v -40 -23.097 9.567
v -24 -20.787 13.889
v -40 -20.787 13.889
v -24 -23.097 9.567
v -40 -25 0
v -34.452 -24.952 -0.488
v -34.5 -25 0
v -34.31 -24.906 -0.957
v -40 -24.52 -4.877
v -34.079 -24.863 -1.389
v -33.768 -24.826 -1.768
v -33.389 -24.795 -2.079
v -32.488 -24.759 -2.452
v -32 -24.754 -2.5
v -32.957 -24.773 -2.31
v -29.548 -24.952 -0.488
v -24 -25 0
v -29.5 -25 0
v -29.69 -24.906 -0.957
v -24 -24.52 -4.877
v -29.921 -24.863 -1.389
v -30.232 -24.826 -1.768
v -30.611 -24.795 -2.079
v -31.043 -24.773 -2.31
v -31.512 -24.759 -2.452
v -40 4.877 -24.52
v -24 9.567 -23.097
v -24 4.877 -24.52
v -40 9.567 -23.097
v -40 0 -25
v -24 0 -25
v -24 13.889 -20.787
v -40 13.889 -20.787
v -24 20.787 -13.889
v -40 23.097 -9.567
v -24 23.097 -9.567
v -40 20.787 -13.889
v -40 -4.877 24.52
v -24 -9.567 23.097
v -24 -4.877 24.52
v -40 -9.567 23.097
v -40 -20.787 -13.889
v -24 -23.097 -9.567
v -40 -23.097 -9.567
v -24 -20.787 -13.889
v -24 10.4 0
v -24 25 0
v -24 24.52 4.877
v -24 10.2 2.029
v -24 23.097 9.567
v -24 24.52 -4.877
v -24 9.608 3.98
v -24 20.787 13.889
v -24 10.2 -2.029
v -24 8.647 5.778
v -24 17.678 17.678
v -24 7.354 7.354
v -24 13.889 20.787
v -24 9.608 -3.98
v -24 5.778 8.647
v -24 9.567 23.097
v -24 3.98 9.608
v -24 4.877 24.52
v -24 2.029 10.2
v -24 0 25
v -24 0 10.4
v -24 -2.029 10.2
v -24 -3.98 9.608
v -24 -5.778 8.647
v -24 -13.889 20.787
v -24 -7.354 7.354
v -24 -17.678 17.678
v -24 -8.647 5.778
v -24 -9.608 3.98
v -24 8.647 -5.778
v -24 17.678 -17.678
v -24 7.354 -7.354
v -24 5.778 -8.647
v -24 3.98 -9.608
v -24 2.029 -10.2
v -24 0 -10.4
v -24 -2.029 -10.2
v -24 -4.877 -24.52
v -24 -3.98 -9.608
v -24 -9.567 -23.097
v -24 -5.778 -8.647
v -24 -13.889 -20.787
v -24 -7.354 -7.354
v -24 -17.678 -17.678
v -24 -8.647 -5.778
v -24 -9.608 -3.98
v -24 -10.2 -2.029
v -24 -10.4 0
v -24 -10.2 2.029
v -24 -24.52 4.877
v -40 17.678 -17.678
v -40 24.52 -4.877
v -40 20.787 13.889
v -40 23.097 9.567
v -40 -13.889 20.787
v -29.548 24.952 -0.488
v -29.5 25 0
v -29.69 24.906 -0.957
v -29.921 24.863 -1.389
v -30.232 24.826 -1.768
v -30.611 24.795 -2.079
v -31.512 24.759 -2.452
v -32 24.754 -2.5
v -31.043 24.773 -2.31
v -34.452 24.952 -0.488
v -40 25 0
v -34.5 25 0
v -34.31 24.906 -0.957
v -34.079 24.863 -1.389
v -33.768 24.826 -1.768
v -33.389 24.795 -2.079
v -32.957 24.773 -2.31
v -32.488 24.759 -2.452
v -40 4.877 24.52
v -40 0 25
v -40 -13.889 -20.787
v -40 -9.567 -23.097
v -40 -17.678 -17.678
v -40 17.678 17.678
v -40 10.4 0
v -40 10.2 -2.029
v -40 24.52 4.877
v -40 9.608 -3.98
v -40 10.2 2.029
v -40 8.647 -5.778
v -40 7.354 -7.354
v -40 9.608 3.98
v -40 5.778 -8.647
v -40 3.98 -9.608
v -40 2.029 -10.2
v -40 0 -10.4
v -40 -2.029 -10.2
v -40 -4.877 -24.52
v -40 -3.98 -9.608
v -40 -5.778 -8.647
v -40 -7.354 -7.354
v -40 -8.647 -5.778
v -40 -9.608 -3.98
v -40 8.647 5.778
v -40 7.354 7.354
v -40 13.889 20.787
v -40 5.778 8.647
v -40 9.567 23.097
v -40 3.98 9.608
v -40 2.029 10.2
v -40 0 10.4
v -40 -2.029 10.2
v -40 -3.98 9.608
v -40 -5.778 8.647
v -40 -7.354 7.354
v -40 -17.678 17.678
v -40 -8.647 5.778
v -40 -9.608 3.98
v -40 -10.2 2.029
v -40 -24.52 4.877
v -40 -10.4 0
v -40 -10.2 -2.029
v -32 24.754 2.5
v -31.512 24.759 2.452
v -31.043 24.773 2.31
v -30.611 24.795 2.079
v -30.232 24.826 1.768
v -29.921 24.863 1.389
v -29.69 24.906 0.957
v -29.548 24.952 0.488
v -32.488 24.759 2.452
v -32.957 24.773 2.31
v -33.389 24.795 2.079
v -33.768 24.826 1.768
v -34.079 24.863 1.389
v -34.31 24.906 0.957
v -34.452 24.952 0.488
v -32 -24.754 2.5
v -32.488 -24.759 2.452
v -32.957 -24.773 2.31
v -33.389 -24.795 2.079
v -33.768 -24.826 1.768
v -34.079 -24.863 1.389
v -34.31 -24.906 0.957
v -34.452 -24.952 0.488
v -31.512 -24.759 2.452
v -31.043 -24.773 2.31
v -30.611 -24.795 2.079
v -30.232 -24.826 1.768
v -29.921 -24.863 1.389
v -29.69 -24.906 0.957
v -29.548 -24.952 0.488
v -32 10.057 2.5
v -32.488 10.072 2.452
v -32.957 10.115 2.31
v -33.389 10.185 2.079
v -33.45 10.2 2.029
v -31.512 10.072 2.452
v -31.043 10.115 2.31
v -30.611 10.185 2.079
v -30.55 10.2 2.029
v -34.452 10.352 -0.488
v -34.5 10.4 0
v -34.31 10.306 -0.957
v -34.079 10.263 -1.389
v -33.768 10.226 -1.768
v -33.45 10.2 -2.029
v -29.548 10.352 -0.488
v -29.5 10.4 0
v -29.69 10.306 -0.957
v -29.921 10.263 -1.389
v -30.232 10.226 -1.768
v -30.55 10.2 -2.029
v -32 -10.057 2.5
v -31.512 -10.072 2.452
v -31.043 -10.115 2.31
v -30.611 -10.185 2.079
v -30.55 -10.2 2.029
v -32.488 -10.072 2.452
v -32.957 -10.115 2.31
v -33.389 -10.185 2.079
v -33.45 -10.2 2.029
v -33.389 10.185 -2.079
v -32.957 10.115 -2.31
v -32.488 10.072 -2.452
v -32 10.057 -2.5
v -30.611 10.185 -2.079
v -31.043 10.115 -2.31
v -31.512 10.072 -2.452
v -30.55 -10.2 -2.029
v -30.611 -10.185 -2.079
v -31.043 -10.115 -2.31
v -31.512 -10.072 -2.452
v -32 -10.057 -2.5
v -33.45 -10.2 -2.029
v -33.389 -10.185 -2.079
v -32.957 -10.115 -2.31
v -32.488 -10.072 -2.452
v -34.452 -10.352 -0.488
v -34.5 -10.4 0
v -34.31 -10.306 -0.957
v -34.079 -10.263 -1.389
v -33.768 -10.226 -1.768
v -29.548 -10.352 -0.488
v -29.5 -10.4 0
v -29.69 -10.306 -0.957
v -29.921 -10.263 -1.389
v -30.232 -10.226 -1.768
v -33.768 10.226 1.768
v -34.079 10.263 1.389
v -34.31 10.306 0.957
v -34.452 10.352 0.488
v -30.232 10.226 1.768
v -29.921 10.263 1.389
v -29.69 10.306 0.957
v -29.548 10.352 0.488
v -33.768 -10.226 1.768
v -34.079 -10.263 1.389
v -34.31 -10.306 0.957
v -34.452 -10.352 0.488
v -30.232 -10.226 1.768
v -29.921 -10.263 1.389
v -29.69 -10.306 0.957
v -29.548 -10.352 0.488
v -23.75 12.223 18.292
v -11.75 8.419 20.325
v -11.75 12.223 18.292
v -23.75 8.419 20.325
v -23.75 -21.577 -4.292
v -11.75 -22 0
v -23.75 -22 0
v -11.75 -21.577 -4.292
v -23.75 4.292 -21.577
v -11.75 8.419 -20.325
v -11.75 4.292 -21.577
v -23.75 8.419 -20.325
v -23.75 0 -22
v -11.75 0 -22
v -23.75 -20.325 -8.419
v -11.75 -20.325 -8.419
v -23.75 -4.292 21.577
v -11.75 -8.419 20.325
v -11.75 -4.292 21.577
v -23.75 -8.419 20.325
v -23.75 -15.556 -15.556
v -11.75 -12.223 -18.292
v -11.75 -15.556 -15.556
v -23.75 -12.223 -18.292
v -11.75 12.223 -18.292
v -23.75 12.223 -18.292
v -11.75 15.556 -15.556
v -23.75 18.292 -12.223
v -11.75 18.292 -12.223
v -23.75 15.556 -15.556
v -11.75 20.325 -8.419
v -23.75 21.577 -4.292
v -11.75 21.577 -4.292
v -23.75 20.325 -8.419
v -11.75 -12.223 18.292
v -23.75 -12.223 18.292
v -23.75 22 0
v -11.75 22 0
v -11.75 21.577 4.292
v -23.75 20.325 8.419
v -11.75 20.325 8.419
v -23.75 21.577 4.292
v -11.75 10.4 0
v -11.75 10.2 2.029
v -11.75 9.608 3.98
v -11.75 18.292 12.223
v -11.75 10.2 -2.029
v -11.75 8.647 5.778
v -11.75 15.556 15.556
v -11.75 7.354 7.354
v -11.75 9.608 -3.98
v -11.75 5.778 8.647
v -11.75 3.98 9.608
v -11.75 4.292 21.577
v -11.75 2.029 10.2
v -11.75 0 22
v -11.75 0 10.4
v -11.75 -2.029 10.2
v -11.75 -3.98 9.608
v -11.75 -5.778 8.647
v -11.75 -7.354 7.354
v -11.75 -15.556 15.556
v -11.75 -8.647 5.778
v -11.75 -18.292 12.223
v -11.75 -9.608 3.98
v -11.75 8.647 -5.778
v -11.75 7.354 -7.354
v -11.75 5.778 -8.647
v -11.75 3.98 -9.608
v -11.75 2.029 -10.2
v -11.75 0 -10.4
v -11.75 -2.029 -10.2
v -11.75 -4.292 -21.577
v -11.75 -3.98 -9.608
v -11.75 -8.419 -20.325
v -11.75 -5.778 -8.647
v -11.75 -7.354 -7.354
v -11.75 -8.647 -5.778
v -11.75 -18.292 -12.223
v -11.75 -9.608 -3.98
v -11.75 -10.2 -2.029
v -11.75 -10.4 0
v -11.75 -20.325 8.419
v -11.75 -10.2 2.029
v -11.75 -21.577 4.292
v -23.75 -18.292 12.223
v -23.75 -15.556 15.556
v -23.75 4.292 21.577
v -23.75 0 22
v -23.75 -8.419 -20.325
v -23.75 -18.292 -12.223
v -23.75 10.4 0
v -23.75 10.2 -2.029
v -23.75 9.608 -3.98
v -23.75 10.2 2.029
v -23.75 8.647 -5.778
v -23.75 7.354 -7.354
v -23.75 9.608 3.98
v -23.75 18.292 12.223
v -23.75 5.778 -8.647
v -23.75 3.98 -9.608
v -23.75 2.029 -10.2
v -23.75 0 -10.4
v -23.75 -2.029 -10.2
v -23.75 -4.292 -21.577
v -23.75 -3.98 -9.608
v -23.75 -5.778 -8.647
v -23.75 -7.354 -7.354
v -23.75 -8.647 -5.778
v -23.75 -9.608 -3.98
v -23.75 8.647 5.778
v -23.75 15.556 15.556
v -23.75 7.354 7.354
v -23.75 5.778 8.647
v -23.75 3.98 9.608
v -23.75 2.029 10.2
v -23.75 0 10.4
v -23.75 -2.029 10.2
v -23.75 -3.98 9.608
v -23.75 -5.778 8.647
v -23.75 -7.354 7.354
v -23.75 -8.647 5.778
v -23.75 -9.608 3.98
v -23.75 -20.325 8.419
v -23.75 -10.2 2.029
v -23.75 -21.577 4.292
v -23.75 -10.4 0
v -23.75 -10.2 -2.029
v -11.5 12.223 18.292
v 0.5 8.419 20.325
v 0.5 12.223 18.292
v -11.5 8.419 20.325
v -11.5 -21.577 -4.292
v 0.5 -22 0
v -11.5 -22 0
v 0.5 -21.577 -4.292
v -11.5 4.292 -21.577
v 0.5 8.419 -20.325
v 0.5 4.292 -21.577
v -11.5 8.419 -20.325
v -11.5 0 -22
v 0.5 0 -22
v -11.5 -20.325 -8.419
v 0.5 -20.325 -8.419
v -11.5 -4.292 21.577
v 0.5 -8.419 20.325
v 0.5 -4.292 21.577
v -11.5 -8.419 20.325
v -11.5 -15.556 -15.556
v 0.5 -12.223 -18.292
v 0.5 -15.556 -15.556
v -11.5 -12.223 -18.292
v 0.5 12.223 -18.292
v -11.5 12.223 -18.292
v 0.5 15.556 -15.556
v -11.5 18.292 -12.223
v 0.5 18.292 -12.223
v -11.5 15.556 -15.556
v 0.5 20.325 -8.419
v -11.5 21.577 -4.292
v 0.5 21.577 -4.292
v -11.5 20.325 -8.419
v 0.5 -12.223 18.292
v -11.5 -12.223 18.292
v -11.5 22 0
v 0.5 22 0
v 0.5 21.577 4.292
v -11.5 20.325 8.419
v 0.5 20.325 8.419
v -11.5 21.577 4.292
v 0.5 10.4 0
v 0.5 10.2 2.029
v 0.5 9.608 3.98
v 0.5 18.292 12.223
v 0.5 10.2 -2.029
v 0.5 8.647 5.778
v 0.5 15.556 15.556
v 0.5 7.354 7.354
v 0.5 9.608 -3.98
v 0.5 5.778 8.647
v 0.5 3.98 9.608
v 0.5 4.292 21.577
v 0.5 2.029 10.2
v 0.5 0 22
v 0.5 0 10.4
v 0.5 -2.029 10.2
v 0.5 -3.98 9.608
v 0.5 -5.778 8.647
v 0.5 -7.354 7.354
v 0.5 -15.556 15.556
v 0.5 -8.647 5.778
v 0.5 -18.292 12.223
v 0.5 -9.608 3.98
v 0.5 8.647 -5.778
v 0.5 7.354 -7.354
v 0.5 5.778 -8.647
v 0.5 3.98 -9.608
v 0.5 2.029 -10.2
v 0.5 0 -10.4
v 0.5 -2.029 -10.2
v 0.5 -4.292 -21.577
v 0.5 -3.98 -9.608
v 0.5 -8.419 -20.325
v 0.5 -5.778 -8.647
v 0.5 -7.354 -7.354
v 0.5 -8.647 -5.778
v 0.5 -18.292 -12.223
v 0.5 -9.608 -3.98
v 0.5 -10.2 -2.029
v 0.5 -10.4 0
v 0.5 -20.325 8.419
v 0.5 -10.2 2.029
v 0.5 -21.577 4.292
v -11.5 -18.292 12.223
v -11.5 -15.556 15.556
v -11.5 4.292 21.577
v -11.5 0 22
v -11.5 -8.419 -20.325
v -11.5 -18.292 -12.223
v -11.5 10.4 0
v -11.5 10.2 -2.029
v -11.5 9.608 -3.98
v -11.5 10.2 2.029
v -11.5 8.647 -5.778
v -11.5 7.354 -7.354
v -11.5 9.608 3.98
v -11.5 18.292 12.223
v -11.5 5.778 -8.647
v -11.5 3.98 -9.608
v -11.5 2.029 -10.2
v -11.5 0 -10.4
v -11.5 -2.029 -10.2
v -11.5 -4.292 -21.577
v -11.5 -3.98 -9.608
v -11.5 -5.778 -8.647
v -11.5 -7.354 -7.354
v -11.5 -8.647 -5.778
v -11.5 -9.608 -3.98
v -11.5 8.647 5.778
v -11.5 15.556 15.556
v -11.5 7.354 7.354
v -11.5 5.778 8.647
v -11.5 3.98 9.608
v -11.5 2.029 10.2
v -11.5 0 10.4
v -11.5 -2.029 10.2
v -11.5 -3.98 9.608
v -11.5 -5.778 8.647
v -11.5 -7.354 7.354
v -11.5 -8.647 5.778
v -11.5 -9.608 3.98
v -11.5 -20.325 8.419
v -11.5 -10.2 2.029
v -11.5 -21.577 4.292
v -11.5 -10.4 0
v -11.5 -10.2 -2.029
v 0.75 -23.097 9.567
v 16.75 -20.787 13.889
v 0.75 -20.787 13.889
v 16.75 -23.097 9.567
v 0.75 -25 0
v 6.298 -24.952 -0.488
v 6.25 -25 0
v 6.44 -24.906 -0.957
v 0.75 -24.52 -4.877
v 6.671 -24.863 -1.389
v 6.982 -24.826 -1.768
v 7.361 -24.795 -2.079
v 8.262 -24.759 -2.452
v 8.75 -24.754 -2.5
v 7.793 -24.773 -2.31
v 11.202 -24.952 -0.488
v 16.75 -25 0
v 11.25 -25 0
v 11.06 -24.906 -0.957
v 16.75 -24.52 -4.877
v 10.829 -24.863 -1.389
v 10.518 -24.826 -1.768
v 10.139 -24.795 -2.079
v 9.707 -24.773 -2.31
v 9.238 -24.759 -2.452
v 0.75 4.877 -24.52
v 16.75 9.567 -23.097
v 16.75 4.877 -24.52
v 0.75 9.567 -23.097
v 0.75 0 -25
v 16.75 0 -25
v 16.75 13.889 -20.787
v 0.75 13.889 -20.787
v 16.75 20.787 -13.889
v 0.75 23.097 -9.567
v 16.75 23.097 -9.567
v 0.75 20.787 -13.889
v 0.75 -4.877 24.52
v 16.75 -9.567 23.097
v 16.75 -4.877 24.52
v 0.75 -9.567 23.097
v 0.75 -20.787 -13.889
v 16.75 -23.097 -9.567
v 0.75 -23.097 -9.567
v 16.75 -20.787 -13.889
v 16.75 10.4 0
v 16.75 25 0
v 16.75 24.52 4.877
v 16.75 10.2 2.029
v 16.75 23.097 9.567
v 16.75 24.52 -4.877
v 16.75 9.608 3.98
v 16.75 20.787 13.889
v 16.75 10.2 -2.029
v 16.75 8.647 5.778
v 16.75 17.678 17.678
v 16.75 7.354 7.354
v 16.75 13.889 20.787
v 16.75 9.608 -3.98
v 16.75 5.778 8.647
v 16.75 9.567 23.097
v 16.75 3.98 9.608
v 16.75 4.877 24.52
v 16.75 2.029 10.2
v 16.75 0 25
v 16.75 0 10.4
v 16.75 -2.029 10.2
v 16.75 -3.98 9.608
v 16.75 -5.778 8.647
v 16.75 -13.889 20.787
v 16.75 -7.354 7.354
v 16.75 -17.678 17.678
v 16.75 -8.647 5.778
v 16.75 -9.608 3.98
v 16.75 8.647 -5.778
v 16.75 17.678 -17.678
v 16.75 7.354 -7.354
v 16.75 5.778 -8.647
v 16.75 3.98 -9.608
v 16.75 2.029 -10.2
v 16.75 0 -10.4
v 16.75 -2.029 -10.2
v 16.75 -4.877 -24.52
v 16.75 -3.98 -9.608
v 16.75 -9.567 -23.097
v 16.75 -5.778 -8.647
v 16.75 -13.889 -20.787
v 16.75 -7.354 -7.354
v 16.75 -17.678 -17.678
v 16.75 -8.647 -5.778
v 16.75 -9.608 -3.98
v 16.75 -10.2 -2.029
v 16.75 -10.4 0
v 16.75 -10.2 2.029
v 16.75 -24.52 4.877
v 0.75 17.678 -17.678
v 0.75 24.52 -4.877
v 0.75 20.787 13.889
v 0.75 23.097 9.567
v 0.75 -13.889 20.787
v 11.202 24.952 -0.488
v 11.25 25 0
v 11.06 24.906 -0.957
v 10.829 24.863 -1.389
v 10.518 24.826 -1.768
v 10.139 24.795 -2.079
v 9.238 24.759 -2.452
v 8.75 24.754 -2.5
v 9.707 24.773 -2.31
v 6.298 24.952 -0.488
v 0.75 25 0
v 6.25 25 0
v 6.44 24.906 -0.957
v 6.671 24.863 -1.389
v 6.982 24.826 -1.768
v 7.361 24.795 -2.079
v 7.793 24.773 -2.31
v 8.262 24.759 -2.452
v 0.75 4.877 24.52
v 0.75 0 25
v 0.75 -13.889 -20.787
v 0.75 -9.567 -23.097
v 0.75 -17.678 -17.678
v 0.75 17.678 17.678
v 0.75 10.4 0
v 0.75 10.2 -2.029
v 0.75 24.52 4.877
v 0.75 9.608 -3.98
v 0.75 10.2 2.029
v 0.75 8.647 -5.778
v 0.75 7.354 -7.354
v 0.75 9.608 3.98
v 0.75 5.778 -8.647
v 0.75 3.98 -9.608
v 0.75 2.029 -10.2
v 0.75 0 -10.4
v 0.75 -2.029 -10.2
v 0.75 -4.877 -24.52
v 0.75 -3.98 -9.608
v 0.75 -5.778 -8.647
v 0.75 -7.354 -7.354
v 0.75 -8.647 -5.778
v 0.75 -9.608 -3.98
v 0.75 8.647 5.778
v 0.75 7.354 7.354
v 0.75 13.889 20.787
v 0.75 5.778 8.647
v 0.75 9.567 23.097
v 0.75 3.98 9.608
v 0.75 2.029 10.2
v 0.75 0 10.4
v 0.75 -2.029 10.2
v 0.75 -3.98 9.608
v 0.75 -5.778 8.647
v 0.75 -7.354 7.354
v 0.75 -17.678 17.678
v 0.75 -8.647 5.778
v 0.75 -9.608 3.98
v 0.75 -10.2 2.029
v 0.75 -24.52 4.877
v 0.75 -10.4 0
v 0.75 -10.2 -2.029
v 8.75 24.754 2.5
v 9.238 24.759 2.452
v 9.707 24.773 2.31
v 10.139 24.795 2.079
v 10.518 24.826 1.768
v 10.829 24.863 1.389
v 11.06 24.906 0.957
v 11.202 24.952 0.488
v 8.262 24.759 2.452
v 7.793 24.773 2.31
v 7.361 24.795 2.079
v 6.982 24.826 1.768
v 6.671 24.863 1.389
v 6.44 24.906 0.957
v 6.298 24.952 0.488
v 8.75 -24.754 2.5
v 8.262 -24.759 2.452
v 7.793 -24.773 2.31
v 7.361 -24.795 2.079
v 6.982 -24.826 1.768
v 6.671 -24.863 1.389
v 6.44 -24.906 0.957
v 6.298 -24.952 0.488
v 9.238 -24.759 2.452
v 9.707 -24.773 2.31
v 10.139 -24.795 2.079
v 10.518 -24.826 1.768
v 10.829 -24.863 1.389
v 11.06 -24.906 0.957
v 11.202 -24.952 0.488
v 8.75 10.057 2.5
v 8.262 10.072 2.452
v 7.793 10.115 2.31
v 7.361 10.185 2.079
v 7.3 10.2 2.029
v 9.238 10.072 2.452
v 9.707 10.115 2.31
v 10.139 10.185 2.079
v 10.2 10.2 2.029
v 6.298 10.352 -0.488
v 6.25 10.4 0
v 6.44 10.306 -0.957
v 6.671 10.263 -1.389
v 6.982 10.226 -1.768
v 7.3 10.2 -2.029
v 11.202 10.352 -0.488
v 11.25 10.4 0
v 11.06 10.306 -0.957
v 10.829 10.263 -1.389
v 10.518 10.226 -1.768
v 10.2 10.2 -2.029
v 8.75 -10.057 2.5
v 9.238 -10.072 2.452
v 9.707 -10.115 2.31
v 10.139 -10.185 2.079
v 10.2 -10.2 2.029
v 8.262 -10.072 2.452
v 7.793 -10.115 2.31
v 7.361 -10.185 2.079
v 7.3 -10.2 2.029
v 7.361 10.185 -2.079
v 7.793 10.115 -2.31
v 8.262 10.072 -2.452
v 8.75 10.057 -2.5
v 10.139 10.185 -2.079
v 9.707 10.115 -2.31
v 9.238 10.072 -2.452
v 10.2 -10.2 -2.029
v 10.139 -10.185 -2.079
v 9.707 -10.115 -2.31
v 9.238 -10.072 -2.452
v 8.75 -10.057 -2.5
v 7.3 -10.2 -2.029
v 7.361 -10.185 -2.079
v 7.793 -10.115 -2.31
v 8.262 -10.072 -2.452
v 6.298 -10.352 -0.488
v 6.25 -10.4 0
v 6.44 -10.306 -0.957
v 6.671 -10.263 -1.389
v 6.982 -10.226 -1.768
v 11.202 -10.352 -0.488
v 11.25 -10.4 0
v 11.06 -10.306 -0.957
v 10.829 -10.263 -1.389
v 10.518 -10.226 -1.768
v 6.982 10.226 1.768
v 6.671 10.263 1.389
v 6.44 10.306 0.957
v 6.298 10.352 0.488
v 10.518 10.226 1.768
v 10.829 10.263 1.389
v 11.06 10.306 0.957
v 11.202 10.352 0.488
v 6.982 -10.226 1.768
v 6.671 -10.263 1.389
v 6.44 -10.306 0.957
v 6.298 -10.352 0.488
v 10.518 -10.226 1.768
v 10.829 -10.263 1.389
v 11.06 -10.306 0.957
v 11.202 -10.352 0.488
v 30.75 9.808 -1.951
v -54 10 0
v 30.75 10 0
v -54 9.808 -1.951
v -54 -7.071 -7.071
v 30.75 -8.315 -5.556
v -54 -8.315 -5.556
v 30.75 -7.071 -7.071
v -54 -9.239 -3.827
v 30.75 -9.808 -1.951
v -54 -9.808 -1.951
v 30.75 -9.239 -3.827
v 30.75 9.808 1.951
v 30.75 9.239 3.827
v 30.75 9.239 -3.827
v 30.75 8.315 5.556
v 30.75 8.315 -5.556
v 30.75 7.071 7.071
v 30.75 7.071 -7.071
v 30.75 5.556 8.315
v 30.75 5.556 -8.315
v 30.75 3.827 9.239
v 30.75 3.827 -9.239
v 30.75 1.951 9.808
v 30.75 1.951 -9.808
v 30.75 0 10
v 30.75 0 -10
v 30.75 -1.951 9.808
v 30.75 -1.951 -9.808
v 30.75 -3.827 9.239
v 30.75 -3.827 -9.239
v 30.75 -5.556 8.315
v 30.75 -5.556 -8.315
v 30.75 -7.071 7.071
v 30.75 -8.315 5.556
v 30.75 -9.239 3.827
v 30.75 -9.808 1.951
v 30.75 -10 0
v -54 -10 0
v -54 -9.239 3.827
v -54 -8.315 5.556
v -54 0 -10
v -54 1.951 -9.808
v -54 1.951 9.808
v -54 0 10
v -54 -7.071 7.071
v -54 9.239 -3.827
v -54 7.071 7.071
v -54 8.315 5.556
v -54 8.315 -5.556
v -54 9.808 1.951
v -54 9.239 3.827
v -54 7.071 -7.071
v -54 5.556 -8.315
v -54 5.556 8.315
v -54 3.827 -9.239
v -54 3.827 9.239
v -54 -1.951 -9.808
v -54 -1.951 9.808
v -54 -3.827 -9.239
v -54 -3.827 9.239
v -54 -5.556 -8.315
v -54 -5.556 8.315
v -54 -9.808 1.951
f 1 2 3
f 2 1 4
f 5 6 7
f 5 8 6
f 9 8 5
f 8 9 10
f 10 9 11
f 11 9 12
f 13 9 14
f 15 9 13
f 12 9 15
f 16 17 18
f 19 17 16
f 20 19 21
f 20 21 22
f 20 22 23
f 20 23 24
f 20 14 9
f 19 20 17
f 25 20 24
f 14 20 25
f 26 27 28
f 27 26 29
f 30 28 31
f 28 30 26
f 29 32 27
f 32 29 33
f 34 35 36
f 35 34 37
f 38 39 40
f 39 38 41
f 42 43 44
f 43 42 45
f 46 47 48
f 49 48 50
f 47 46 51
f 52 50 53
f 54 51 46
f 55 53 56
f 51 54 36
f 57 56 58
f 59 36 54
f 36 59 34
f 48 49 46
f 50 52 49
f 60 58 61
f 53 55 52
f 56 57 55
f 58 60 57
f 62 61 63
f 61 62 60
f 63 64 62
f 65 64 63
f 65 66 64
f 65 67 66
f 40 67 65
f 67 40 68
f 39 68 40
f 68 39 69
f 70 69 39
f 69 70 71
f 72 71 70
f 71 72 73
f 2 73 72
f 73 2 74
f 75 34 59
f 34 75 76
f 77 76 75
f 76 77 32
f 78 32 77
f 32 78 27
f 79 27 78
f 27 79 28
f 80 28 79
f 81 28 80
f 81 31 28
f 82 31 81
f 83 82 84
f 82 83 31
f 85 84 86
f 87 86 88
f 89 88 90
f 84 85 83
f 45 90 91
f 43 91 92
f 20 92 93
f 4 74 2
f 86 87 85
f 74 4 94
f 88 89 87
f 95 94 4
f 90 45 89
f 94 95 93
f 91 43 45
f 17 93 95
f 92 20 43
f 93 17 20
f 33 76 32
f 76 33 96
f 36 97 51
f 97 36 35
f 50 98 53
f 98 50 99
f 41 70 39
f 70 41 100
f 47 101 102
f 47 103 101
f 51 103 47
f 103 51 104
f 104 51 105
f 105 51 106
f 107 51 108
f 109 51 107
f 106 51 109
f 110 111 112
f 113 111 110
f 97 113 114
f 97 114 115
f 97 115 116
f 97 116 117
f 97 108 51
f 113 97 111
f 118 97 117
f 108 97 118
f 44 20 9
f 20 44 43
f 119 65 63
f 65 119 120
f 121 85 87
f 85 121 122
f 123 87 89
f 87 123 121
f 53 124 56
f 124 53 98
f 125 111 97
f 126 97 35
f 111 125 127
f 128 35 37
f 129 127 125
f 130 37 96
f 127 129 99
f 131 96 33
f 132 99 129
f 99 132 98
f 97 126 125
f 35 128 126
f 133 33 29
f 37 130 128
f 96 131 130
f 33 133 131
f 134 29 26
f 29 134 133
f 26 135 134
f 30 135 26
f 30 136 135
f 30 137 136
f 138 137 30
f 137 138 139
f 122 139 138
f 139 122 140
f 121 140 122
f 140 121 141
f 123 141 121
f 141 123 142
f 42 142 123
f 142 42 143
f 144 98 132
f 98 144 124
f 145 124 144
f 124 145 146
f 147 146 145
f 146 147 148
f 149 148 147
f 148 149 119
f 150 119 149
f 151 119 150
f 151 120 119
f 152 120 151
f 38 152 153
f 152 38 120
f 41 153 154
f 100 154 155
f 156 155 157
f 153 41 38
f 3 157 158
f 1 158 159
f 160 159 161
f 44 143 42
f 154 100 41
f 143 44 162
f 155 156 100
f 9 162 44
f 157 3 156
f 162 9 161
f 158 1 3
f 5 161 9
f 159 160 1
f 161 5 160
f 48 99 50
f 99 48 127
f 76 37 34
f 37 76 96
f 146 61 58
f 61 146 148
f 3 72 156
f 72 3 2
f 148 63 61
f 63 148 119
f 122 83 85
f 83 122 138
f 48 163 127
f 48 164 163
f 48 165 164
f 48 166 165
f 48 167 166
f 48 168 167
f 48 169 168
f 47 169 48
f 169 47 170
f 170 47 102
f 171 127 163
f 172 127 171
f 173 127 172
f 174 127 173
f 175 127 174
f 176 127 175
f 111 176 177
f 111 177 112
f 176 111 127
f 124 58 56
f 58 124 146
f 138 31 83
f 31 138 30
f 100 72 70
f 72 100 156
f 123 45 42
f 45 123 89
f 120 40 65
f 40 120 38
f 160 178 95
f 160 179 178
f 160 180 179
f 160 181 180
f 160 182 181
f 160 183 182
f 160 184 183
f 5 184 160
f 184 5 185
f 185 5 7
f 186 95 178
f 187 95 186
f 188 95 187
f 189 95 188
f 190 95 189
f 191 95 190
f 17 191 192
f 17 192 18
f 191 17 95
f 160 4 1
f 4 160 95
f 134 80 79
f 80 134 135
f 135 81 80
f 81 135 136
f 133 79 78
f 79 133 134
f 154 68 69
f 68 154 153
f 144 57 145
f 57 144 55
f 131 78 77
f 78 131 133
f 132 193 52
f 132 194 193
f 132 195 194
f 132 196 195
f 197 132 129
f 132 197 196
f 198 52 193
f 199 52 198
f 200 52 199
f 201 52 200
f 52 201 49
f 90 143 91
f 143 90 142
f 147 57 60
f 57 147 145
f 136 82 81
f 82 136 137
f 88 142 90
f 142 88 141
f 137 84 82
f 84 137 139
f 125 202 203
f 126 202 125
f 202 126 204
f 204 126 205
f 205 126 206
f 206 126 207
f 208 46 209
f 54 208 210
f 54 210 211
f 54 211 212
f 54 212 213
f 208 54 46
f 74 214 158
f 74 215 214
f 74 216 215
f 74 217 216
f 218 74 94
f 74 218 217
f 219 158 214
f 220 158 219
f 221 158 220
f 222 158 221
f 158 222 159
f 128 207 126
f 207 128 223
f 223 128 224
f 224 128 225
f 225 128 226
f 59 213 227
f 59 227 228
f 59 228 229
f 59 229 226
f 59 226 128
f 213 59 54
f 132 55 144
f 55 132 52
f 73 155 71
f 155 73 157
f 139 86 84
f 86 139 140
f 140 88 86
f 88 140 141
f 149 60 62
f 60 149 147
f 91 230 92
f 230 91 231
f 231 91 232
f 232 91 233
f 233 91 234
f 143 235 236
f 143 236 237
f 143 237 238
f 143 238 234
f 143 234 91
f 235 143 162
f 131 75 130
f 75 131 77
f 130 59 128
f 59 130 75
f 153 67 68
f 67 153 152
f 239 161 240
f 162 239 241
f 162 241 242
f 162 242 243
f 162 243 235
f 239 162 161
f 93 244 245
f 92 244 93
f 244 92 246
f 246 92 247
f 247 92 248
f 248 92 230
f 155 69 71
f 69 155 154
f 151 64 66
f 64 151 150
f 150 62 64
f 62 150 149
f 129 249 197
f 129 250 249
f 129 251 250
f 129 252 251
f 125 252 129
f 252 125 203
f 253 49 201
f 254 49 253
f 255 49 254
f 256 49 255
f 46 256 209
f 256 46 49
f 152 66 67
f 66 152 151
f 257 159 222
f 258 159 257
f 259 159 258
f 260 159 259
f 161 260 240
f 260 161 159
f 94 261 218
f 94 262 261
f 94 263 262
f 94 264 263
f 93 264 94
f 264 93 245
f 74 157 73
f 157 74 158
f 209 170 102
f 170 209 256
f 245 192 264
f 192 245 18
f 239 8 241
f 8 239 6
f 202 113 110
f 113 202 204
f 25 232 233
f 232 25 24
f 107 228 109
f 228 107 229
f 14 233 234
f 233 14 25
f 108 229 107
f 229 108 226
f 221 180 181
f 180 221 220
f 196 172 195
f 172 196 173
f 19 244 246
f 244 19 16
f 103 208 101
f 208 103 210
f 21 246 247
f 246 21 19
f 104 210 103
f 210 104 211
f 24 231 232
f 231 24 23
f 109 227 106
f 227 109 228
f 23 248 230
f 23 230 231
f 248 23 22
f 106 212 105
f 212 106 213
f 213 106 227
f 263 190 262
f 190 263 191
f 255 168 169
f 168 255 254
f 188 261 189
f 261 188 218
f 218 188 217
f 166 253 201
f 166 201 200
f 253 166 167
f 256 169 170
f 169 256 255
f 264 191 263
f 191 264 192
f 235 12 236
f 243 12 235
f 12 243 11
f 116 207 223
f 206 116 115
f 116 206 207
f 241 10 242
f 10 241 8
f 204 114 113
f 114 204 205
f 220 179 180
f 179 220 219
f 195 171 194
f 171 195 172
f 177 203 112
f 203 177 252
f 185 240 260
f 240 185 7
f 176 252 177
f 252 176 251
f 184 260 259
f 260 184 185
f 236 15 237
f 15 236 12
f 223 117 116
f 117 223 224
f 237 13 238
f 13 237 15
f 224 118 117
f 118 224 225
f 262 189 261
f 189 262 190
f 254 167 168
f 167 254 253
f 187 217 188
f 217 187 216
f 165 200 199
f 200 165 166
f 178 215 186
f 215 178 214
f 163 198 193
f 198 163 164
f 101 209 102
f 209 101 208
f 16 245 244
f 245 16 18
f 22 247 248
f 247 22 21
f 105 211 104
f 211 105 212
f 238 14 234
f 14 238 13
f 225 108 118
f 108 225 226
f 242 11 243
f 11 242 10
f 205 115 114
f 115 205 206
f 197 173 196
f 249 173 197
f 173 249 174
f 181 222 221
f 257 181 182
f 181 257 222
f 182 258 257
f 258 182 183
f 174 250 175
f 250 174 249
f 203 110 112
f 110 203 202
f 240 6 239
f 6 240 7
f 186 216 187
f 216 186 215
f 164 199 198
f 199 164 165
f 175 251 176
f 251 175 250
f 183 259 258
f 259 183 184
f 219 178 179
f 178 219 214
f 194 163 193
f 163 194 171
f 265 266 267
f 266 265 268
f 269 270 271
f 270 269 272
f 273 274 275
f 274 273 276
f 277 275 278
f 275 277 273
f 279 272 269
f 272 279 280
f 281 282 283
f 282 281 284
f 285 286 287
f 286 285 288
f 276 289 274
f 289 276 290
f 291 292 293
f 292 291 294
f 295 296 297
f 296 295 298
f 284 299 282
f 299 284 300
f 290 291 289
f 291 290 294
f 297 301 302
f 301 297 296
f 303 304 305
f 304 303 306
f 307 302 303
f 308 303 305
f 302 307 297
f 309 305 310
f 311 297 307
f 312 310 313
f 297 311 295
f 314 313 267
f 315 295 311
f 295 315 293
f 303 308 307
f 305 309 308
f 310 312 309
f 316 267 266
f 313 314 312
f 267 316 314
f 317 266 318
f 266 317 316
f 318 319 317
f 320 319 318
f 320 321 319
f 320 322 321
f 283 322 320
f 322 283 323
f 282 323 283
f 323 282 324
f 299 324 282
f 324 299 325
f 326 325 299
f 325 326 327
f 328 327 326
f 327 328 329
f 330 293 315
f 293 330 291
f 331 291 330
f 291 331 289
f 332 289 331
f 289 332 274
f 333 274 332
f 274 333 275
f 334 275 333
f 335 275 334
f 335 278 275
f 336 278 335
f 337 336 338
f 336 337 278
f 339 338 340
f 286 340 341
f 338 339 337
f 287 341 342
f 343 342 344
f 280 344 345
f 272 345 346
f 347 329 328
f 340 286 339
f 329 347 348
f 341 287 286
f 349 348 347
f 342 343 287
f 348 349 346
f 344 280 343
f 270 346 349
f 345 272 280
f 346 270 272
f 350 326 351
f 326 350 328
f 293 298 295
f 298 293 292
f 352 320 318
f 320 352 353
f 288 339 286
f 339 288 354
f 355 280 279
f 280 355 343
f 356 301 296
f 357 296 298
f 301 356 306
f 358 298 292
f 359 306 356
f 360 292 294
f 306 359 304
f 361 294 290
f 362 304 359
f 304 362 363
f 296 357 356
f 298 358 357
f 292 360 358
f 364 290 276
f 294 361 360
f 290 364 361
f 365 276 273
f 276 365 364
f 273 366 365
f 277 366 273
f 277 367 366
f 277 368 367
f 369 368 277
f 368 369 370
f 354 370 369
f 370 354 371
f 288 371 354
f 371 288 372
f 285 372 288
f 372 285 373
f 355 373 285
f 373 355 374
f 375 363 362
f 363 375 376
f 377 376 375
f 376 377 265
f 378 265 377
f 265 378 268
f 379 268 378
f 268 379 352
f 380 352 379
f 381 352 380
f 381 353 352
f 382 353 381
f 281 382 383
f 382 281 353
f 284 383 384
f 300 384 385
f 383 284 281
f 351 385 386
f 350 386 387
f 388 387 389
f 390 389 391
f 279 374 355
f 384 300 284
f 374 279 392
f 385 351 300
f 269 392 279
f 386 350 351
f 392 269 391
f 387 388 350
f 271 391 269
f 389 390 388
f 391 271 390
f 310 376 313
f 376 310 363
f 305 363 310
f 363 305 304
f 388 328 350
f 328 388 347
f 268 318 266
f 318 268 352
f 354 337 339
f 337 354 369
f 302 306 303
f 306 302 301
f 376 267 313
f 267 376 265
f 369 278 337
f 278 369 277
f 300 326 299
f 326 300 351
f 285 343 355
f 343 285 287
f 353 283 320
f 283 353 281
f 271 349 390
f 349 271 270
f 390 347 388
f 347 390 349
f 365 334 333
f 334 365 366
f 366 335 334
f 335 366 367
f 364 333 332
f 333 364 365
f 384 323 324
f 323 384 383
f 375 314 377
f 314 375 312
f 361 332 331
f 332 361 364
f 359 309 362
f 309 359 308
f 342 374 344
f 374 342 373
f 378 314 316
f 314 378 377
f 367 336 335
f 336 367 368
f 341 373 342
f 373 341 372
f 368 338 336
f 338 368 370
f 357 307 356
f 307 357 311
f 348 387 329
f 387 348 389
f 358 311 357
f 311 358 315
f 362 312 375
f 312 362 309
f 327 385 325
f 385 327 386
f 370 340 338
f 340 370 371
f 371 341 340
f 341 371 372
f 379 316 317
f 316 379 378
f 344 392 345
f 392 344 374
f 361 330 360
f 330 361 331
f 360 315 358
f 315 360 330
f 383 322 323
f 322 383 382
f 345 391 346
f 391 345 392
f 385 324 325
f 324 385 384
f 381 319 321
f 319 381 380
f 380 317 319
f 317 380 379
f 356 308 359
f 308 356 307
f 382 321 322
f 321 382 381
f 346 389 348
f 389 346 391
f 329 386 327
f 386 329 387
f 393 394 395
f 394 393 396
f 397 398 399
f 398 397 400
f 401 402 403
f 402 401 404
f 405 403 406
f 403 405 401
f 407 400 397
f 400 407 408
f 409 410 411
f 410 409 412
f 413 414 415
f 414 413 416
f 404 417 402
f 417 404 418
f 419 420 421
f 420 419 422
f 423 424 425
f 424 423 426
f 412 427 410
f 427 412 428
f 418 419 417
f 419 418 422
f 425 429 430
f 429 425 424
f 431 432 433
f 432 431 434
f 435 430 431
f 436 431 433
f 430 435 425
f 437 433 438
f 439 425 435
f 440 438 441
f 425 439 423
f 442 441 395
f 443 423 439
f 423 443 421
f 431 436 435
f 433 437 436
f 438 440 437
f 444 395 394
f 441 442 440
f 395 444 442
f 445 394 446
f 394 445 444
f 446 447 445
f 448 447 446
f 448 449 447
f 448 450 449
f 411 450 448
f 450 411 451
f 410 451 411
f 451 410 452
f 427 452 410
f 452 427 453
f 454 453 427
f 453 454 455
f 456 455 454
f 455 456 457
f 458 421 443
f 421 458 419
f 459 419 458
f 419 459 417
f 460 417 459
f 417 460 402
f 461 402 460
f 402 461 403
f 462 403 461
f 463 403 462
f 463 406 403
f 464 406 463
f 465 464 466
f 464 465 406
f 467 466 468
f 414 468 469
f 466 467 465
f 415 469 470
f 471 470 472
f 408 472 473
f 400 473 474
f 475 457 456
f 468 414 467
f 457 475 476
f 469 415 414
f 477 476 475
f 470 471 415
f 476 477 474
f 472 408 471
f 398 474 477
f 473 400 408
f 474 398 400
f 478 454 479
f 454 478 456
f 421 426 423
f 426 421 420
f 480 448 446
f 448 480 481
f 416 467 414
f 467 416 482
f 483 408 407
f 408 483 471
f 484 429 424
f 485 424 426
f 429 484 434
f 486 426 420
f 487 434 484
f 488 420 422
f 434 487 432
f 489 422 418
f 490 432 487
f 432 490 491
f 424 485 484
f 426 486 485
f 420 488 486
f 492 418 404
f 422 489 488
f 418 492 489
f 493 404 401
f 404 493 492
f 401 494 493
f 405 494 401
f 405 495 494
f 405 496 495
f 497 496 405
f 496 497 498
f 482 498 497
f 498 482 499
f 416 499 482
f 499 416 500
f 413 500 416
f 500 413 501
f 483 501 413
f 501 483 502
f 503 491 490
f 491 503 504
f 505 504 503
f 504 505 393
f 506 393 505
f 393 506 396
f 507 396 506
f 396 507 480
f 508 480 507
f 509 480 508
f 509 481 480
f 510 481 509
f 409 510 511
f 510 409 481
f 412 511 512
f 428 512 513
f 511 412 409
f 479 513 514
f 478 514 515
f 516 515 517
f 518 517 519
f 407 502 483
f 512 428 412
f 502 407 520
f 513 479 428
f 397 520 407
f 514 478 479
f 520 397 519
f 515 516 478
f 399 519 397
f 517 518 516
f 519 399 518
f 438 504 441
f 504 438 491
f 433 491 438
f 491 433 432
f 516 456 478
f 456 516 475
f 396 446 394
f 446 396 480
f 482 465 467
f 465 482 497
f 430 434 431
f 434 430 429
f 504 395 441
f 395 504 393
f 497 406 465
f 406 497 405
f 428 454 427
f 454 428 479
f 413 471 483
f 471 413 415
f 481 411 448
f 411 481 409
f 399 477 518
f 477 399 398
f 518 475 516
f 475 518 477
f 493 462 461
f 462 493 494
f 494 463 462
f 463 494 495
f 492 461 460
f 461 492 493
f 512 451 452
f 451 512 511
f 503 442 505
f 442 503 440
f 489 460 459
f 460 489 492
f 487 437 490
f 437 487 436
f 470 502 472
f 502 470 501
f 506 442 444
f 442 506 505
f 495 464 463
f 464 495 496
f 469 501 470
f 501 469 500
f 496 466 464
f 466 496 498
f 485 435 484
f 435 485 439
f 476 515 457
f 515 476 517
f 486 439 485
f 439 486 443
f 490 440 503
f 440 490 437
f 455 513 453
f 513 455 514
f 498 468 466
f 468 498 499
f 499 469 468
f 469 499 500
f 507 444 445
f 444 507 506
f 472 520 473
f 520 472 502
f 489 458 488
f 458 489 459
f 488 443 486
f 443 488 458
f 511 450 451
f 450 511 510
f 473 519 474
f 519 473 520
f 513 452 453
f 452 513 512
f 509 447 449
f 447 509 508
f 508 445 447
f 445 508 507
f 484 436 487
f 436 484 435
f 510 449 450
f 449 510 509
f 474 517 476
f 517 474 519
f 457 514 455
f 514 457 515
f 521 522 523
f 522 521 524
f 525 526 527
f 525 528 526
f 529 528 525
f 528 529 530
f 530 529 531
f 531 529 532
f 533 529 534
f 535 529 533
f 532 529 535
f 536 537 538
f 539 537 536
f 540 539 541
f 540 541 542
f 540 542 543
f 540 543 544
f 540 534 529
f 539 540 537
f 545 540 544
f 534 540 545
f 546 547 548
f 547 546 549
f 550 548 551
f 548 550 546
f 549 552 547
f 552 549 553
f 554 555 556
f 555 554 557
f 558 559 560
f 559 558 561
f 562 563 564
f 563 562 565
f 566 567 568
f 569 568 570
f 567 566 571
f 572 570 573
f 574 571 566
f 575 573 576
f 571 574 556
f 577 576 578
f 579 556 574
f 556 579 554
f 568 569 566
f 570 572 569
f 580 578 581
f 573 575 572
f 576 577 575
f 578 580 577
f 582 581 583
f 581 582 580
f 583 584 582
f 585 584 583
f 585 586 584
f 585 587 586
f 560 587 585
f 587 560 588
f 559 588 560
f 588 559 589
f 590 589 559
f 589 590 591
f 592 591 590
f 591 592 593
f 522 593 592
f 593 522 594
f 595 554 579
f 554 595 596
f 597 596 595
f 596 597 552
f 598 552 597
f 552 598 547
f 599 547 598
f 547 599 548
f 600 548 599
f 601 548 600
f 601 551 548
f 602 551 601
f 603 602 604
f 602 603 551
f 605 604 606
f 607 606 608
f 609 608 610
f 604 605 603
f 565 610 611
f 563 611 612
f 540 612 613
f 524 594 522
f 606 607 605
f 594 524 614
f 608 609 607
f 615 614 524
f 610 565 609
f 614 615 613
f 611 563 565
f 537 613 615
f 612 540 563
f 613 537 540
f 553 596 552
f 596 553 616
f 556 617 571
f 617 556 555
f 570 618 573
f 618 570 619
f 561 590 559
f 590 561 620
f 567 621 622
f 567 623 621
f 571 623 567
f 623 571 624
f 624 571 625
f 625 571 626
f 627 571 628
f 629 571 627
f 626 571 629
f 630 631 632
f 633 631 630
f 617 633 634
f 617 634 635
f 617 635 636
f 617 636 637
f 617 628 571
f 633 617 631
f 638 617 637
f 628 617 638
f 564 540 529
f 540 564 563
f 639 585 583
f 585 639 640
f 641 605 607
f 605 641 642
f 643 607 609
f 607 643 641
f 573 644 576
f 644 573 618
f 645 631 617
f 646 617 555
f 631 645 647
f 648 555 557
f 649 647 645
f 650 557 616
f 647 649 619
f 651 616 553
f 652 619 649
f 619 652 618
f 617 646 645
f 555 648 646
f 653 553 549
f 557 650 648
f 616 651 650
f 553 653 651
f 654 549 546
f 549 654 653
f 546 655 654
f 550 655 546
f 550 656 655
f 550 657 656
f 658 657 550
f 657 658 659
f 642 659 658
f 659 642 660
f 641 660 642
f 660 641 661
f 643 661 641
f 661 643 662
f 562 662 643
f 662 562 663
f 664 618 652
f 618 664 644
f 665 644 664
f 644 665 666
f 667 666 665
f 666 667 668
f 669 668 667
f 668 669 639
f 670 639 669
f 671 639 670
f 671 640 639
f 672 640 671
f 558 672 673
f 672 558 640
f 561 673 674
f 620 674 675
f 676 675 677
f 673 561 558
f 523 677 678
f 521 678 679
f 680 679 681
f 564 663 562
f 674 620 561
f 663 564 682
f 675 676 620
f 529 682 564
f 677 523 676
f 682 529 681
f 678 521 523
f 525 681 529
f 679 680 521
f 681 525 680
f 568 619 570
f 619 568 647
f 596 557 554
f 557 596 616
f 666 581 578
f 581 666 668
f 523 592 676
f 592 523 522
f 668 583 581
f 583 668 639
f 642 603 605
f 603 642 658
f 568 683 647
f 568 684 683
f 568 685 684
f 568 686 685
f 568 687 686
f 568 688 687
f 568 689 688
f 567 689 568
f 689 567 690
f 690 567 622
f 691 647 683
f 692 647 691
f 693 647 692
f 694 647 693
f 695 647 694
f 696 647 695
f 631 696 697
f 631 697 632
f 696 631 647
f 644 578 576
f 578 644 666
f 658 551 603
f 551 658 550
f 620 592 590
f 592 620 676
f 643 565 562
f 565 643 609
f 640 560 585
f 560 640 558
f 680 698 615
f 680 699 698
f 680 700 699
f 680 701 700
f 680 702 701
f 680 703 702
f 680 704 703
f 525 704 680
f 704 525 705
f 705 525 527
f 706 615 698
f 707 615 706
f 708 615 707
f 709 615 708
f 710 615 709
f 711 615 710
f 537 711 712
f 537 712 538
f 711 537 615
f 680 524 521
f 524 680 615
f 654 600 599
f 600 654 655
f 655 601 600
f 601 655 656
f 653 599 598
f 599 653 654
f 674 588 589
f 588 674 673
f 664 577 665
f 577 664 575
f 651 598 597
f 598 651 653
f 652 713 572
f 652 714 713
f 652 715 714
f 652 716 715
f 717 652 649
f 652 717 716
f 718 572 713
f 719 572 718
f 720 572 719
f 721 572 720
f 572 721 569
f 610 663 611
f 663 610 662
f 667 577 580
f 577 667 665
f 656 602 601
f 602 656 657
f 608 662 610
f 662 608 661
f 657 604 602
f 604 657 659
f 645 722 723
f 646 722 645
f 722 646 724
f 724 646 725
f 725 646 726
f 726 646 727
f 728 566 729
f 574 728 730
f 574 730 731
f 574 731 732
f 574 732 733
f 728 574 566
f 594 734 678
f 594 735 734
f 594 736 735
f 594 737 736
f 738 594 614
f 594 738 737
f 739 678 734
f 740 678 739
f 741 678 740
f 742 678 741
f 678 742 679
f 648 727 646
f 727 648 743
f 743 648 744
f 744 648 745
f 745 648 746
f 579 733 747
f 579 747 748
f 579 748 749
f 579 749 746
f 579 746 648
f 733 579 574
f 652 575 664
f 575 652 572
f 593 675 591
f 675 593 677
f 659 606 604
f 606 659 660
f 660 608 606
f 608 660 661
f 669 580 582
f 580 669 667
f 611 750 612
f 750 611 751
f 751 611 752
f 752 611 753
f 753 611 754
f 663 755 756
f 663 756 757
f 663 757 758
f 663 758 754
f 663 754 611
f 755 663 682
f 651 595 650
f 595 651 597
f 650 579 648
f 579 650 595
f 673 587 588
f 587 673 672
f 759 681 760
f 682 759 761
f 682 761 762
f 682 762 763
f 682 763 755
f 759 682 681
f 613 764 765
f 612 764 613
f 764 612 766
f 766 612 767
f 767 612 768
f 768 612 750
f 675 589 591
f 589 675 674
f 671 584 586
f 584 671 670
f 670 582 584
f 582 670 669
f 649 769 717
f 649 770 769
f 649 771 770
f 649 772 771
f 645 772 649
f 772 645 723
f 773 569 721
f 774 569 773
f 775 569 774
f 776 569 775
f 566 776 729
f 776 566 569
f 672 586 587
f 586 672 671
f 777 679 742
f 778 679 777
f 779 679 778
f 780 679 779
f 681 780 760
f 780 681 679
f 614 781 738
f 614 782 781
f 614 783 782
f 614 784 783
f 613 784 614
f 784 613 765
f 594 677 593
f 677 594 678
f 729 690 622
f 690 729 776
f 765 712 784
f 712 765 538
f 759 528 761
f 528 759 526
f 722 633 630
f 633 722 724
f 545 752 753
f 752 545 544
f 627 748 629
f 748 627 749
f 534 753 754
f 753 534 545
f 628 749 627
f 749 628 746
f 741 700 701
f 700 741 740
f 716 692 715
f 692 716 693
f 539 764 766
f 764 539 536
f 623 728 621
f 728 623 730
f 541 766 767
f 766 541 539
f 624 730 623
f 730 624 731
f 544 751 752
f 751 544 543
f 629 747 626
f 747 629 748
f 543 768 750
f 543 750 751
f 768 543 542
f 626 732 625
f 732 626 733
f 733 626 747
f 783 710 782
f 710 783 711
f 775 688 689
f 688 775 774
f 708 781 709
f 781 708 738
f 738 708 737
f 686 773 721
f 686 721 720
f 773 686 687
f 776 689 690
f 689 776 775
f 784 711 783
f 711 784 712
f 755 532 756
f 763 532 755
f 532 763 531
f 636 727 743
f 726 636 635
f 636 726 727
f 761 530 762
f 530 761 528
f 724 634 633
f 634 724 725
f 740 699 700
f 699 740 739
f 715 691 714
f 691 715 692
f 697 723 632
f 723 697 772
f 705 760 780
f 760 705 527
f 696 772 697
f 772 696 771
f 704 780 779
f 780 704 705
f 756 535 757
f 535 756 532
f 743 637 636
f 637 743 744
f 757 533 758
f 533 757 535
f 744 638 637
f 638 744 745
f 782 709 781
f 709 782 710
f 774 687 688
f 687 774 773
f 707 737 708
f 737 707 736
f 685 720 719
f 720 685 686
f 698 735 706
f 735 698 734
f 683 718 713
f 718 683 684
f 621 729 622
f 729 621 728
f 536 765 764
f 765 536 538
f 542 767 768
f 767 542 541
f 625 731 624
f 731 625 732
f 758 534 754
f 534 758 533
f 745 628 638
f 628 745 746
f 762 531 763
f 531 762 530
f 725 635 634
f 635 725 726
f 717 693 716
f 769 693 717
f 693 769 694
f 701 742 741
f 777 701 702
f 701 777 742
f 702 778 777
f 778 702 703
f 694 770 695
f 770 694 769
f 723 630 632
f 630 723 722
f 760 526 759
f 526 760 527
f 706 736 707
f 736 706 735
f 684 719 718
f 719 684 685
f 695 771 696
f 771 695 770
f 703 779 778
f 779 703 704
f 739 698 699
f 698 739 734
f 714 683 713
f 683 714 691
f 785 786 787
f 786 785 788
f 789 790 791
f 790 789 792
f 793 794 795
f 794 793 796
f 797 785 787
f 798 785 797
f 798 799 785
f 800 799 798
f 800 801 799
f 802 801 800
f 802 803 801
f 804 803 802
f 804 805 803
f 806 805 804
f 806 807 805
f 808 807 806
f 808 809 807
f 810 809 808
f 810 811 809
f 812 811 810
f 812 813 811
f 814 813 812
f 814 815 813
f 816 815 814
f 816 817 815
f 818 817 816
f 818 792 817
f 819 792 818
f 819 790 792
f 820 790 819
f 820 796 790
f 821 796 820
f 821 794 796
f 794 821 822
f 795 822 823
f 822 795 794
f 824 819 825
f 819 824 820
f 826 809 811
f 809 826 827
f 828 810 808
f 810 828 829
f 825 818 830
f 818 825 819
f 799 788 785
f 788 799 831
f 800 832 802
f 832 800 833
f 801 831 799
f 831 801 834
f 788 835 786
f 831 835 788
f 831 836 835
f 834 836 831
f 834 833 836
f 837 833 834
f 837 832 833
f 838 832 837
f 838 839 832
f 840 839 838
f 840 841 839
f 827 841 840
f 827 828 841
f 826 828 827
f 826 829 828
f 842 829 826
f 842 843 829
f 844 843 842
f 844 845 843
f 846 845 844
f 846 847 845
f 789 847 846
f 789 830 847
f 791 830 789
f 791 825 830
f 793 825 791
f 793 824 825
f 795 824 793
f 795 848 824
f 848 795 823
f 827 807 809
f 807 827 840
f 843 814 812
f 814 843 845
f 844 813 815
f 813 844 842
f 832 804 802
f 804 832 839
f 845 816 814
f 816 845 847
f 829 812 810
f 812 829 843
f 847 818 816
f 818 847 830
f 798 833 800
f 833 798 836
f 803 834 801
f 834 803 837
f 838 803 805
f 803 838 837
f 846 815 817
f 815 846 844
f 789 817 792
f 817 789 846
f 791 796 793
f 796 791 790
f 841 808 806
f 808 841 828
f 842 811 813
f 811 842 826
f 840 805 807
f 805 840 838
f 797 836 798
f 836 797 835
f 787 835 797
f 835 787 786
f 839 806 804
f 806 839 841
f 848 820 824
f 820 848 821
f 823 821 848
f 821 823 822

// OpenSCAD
$fn = 32;

// ------------------------------------------------------------------------
// Shaft with rings and collars: d20 shaft, 4 rings
// Every part is its own module, assembly() places them once.
// ------------------------------------------------------------------------

// --- part 1 ---
module shaft() {
  translate([0, 0, -42.375]) cylinder(h = 84.75, d = 20);
}

// --- part 2 ---
module collar_a() {
  difference() {
    cylinder(h = 16, d = 50);
    translate([0, 0, -1]) cylinder(h = 18, d = 20.8);
    translate([0, 0, 8]) rotate([90, 0, 0]) cylinder(h = 52, d = 5, center = true);
  }
}

// --- part 3 ---
module spacer_a() {
  difference() {
      translate([0, 0, 0]) cylinder(h = 12, d = 44);
      translate([0, 0, -1]) cylinder(h = 14, d = 20.8);
    }
}

// --- part 4 ---
module spacer_b() {
  difference() {
      translate([0, 0, 0]) cylinder(h = 12, d = 44);
      translate([0, 0, -1]) cylinder(h = 14, d = 20.8);
    }
}

// --- part 5 ---
module collar_b() {
  difference() {
    cylinder(h = 16, d = 50);
    translate([0, 0, -1]) cylinder(h = 18, d = 20.8);
    translate([0, 0, 8]) rotate([90, 0, 0]) cylinder(h = 52, d = 5, center = true);
  }
}

// --- assembly ---
module assembly() {
  translate([-11.625, 0, 0]) rotate([0, 90, 0]) shaft();
  translate([-40, 0, 0]) rotate([0, 90, 0]) collar_a();
  translate([-23.75, 0, 0]) rotate([0, 90, 0]) spacer_a();
  translate([-11.5, 0, 0]) rotate([0, 90, 0]) spacer_b();
  translate([0.75, 0, 0]) rotate([0, 90, 0]) collar_b();
}

assembly();
